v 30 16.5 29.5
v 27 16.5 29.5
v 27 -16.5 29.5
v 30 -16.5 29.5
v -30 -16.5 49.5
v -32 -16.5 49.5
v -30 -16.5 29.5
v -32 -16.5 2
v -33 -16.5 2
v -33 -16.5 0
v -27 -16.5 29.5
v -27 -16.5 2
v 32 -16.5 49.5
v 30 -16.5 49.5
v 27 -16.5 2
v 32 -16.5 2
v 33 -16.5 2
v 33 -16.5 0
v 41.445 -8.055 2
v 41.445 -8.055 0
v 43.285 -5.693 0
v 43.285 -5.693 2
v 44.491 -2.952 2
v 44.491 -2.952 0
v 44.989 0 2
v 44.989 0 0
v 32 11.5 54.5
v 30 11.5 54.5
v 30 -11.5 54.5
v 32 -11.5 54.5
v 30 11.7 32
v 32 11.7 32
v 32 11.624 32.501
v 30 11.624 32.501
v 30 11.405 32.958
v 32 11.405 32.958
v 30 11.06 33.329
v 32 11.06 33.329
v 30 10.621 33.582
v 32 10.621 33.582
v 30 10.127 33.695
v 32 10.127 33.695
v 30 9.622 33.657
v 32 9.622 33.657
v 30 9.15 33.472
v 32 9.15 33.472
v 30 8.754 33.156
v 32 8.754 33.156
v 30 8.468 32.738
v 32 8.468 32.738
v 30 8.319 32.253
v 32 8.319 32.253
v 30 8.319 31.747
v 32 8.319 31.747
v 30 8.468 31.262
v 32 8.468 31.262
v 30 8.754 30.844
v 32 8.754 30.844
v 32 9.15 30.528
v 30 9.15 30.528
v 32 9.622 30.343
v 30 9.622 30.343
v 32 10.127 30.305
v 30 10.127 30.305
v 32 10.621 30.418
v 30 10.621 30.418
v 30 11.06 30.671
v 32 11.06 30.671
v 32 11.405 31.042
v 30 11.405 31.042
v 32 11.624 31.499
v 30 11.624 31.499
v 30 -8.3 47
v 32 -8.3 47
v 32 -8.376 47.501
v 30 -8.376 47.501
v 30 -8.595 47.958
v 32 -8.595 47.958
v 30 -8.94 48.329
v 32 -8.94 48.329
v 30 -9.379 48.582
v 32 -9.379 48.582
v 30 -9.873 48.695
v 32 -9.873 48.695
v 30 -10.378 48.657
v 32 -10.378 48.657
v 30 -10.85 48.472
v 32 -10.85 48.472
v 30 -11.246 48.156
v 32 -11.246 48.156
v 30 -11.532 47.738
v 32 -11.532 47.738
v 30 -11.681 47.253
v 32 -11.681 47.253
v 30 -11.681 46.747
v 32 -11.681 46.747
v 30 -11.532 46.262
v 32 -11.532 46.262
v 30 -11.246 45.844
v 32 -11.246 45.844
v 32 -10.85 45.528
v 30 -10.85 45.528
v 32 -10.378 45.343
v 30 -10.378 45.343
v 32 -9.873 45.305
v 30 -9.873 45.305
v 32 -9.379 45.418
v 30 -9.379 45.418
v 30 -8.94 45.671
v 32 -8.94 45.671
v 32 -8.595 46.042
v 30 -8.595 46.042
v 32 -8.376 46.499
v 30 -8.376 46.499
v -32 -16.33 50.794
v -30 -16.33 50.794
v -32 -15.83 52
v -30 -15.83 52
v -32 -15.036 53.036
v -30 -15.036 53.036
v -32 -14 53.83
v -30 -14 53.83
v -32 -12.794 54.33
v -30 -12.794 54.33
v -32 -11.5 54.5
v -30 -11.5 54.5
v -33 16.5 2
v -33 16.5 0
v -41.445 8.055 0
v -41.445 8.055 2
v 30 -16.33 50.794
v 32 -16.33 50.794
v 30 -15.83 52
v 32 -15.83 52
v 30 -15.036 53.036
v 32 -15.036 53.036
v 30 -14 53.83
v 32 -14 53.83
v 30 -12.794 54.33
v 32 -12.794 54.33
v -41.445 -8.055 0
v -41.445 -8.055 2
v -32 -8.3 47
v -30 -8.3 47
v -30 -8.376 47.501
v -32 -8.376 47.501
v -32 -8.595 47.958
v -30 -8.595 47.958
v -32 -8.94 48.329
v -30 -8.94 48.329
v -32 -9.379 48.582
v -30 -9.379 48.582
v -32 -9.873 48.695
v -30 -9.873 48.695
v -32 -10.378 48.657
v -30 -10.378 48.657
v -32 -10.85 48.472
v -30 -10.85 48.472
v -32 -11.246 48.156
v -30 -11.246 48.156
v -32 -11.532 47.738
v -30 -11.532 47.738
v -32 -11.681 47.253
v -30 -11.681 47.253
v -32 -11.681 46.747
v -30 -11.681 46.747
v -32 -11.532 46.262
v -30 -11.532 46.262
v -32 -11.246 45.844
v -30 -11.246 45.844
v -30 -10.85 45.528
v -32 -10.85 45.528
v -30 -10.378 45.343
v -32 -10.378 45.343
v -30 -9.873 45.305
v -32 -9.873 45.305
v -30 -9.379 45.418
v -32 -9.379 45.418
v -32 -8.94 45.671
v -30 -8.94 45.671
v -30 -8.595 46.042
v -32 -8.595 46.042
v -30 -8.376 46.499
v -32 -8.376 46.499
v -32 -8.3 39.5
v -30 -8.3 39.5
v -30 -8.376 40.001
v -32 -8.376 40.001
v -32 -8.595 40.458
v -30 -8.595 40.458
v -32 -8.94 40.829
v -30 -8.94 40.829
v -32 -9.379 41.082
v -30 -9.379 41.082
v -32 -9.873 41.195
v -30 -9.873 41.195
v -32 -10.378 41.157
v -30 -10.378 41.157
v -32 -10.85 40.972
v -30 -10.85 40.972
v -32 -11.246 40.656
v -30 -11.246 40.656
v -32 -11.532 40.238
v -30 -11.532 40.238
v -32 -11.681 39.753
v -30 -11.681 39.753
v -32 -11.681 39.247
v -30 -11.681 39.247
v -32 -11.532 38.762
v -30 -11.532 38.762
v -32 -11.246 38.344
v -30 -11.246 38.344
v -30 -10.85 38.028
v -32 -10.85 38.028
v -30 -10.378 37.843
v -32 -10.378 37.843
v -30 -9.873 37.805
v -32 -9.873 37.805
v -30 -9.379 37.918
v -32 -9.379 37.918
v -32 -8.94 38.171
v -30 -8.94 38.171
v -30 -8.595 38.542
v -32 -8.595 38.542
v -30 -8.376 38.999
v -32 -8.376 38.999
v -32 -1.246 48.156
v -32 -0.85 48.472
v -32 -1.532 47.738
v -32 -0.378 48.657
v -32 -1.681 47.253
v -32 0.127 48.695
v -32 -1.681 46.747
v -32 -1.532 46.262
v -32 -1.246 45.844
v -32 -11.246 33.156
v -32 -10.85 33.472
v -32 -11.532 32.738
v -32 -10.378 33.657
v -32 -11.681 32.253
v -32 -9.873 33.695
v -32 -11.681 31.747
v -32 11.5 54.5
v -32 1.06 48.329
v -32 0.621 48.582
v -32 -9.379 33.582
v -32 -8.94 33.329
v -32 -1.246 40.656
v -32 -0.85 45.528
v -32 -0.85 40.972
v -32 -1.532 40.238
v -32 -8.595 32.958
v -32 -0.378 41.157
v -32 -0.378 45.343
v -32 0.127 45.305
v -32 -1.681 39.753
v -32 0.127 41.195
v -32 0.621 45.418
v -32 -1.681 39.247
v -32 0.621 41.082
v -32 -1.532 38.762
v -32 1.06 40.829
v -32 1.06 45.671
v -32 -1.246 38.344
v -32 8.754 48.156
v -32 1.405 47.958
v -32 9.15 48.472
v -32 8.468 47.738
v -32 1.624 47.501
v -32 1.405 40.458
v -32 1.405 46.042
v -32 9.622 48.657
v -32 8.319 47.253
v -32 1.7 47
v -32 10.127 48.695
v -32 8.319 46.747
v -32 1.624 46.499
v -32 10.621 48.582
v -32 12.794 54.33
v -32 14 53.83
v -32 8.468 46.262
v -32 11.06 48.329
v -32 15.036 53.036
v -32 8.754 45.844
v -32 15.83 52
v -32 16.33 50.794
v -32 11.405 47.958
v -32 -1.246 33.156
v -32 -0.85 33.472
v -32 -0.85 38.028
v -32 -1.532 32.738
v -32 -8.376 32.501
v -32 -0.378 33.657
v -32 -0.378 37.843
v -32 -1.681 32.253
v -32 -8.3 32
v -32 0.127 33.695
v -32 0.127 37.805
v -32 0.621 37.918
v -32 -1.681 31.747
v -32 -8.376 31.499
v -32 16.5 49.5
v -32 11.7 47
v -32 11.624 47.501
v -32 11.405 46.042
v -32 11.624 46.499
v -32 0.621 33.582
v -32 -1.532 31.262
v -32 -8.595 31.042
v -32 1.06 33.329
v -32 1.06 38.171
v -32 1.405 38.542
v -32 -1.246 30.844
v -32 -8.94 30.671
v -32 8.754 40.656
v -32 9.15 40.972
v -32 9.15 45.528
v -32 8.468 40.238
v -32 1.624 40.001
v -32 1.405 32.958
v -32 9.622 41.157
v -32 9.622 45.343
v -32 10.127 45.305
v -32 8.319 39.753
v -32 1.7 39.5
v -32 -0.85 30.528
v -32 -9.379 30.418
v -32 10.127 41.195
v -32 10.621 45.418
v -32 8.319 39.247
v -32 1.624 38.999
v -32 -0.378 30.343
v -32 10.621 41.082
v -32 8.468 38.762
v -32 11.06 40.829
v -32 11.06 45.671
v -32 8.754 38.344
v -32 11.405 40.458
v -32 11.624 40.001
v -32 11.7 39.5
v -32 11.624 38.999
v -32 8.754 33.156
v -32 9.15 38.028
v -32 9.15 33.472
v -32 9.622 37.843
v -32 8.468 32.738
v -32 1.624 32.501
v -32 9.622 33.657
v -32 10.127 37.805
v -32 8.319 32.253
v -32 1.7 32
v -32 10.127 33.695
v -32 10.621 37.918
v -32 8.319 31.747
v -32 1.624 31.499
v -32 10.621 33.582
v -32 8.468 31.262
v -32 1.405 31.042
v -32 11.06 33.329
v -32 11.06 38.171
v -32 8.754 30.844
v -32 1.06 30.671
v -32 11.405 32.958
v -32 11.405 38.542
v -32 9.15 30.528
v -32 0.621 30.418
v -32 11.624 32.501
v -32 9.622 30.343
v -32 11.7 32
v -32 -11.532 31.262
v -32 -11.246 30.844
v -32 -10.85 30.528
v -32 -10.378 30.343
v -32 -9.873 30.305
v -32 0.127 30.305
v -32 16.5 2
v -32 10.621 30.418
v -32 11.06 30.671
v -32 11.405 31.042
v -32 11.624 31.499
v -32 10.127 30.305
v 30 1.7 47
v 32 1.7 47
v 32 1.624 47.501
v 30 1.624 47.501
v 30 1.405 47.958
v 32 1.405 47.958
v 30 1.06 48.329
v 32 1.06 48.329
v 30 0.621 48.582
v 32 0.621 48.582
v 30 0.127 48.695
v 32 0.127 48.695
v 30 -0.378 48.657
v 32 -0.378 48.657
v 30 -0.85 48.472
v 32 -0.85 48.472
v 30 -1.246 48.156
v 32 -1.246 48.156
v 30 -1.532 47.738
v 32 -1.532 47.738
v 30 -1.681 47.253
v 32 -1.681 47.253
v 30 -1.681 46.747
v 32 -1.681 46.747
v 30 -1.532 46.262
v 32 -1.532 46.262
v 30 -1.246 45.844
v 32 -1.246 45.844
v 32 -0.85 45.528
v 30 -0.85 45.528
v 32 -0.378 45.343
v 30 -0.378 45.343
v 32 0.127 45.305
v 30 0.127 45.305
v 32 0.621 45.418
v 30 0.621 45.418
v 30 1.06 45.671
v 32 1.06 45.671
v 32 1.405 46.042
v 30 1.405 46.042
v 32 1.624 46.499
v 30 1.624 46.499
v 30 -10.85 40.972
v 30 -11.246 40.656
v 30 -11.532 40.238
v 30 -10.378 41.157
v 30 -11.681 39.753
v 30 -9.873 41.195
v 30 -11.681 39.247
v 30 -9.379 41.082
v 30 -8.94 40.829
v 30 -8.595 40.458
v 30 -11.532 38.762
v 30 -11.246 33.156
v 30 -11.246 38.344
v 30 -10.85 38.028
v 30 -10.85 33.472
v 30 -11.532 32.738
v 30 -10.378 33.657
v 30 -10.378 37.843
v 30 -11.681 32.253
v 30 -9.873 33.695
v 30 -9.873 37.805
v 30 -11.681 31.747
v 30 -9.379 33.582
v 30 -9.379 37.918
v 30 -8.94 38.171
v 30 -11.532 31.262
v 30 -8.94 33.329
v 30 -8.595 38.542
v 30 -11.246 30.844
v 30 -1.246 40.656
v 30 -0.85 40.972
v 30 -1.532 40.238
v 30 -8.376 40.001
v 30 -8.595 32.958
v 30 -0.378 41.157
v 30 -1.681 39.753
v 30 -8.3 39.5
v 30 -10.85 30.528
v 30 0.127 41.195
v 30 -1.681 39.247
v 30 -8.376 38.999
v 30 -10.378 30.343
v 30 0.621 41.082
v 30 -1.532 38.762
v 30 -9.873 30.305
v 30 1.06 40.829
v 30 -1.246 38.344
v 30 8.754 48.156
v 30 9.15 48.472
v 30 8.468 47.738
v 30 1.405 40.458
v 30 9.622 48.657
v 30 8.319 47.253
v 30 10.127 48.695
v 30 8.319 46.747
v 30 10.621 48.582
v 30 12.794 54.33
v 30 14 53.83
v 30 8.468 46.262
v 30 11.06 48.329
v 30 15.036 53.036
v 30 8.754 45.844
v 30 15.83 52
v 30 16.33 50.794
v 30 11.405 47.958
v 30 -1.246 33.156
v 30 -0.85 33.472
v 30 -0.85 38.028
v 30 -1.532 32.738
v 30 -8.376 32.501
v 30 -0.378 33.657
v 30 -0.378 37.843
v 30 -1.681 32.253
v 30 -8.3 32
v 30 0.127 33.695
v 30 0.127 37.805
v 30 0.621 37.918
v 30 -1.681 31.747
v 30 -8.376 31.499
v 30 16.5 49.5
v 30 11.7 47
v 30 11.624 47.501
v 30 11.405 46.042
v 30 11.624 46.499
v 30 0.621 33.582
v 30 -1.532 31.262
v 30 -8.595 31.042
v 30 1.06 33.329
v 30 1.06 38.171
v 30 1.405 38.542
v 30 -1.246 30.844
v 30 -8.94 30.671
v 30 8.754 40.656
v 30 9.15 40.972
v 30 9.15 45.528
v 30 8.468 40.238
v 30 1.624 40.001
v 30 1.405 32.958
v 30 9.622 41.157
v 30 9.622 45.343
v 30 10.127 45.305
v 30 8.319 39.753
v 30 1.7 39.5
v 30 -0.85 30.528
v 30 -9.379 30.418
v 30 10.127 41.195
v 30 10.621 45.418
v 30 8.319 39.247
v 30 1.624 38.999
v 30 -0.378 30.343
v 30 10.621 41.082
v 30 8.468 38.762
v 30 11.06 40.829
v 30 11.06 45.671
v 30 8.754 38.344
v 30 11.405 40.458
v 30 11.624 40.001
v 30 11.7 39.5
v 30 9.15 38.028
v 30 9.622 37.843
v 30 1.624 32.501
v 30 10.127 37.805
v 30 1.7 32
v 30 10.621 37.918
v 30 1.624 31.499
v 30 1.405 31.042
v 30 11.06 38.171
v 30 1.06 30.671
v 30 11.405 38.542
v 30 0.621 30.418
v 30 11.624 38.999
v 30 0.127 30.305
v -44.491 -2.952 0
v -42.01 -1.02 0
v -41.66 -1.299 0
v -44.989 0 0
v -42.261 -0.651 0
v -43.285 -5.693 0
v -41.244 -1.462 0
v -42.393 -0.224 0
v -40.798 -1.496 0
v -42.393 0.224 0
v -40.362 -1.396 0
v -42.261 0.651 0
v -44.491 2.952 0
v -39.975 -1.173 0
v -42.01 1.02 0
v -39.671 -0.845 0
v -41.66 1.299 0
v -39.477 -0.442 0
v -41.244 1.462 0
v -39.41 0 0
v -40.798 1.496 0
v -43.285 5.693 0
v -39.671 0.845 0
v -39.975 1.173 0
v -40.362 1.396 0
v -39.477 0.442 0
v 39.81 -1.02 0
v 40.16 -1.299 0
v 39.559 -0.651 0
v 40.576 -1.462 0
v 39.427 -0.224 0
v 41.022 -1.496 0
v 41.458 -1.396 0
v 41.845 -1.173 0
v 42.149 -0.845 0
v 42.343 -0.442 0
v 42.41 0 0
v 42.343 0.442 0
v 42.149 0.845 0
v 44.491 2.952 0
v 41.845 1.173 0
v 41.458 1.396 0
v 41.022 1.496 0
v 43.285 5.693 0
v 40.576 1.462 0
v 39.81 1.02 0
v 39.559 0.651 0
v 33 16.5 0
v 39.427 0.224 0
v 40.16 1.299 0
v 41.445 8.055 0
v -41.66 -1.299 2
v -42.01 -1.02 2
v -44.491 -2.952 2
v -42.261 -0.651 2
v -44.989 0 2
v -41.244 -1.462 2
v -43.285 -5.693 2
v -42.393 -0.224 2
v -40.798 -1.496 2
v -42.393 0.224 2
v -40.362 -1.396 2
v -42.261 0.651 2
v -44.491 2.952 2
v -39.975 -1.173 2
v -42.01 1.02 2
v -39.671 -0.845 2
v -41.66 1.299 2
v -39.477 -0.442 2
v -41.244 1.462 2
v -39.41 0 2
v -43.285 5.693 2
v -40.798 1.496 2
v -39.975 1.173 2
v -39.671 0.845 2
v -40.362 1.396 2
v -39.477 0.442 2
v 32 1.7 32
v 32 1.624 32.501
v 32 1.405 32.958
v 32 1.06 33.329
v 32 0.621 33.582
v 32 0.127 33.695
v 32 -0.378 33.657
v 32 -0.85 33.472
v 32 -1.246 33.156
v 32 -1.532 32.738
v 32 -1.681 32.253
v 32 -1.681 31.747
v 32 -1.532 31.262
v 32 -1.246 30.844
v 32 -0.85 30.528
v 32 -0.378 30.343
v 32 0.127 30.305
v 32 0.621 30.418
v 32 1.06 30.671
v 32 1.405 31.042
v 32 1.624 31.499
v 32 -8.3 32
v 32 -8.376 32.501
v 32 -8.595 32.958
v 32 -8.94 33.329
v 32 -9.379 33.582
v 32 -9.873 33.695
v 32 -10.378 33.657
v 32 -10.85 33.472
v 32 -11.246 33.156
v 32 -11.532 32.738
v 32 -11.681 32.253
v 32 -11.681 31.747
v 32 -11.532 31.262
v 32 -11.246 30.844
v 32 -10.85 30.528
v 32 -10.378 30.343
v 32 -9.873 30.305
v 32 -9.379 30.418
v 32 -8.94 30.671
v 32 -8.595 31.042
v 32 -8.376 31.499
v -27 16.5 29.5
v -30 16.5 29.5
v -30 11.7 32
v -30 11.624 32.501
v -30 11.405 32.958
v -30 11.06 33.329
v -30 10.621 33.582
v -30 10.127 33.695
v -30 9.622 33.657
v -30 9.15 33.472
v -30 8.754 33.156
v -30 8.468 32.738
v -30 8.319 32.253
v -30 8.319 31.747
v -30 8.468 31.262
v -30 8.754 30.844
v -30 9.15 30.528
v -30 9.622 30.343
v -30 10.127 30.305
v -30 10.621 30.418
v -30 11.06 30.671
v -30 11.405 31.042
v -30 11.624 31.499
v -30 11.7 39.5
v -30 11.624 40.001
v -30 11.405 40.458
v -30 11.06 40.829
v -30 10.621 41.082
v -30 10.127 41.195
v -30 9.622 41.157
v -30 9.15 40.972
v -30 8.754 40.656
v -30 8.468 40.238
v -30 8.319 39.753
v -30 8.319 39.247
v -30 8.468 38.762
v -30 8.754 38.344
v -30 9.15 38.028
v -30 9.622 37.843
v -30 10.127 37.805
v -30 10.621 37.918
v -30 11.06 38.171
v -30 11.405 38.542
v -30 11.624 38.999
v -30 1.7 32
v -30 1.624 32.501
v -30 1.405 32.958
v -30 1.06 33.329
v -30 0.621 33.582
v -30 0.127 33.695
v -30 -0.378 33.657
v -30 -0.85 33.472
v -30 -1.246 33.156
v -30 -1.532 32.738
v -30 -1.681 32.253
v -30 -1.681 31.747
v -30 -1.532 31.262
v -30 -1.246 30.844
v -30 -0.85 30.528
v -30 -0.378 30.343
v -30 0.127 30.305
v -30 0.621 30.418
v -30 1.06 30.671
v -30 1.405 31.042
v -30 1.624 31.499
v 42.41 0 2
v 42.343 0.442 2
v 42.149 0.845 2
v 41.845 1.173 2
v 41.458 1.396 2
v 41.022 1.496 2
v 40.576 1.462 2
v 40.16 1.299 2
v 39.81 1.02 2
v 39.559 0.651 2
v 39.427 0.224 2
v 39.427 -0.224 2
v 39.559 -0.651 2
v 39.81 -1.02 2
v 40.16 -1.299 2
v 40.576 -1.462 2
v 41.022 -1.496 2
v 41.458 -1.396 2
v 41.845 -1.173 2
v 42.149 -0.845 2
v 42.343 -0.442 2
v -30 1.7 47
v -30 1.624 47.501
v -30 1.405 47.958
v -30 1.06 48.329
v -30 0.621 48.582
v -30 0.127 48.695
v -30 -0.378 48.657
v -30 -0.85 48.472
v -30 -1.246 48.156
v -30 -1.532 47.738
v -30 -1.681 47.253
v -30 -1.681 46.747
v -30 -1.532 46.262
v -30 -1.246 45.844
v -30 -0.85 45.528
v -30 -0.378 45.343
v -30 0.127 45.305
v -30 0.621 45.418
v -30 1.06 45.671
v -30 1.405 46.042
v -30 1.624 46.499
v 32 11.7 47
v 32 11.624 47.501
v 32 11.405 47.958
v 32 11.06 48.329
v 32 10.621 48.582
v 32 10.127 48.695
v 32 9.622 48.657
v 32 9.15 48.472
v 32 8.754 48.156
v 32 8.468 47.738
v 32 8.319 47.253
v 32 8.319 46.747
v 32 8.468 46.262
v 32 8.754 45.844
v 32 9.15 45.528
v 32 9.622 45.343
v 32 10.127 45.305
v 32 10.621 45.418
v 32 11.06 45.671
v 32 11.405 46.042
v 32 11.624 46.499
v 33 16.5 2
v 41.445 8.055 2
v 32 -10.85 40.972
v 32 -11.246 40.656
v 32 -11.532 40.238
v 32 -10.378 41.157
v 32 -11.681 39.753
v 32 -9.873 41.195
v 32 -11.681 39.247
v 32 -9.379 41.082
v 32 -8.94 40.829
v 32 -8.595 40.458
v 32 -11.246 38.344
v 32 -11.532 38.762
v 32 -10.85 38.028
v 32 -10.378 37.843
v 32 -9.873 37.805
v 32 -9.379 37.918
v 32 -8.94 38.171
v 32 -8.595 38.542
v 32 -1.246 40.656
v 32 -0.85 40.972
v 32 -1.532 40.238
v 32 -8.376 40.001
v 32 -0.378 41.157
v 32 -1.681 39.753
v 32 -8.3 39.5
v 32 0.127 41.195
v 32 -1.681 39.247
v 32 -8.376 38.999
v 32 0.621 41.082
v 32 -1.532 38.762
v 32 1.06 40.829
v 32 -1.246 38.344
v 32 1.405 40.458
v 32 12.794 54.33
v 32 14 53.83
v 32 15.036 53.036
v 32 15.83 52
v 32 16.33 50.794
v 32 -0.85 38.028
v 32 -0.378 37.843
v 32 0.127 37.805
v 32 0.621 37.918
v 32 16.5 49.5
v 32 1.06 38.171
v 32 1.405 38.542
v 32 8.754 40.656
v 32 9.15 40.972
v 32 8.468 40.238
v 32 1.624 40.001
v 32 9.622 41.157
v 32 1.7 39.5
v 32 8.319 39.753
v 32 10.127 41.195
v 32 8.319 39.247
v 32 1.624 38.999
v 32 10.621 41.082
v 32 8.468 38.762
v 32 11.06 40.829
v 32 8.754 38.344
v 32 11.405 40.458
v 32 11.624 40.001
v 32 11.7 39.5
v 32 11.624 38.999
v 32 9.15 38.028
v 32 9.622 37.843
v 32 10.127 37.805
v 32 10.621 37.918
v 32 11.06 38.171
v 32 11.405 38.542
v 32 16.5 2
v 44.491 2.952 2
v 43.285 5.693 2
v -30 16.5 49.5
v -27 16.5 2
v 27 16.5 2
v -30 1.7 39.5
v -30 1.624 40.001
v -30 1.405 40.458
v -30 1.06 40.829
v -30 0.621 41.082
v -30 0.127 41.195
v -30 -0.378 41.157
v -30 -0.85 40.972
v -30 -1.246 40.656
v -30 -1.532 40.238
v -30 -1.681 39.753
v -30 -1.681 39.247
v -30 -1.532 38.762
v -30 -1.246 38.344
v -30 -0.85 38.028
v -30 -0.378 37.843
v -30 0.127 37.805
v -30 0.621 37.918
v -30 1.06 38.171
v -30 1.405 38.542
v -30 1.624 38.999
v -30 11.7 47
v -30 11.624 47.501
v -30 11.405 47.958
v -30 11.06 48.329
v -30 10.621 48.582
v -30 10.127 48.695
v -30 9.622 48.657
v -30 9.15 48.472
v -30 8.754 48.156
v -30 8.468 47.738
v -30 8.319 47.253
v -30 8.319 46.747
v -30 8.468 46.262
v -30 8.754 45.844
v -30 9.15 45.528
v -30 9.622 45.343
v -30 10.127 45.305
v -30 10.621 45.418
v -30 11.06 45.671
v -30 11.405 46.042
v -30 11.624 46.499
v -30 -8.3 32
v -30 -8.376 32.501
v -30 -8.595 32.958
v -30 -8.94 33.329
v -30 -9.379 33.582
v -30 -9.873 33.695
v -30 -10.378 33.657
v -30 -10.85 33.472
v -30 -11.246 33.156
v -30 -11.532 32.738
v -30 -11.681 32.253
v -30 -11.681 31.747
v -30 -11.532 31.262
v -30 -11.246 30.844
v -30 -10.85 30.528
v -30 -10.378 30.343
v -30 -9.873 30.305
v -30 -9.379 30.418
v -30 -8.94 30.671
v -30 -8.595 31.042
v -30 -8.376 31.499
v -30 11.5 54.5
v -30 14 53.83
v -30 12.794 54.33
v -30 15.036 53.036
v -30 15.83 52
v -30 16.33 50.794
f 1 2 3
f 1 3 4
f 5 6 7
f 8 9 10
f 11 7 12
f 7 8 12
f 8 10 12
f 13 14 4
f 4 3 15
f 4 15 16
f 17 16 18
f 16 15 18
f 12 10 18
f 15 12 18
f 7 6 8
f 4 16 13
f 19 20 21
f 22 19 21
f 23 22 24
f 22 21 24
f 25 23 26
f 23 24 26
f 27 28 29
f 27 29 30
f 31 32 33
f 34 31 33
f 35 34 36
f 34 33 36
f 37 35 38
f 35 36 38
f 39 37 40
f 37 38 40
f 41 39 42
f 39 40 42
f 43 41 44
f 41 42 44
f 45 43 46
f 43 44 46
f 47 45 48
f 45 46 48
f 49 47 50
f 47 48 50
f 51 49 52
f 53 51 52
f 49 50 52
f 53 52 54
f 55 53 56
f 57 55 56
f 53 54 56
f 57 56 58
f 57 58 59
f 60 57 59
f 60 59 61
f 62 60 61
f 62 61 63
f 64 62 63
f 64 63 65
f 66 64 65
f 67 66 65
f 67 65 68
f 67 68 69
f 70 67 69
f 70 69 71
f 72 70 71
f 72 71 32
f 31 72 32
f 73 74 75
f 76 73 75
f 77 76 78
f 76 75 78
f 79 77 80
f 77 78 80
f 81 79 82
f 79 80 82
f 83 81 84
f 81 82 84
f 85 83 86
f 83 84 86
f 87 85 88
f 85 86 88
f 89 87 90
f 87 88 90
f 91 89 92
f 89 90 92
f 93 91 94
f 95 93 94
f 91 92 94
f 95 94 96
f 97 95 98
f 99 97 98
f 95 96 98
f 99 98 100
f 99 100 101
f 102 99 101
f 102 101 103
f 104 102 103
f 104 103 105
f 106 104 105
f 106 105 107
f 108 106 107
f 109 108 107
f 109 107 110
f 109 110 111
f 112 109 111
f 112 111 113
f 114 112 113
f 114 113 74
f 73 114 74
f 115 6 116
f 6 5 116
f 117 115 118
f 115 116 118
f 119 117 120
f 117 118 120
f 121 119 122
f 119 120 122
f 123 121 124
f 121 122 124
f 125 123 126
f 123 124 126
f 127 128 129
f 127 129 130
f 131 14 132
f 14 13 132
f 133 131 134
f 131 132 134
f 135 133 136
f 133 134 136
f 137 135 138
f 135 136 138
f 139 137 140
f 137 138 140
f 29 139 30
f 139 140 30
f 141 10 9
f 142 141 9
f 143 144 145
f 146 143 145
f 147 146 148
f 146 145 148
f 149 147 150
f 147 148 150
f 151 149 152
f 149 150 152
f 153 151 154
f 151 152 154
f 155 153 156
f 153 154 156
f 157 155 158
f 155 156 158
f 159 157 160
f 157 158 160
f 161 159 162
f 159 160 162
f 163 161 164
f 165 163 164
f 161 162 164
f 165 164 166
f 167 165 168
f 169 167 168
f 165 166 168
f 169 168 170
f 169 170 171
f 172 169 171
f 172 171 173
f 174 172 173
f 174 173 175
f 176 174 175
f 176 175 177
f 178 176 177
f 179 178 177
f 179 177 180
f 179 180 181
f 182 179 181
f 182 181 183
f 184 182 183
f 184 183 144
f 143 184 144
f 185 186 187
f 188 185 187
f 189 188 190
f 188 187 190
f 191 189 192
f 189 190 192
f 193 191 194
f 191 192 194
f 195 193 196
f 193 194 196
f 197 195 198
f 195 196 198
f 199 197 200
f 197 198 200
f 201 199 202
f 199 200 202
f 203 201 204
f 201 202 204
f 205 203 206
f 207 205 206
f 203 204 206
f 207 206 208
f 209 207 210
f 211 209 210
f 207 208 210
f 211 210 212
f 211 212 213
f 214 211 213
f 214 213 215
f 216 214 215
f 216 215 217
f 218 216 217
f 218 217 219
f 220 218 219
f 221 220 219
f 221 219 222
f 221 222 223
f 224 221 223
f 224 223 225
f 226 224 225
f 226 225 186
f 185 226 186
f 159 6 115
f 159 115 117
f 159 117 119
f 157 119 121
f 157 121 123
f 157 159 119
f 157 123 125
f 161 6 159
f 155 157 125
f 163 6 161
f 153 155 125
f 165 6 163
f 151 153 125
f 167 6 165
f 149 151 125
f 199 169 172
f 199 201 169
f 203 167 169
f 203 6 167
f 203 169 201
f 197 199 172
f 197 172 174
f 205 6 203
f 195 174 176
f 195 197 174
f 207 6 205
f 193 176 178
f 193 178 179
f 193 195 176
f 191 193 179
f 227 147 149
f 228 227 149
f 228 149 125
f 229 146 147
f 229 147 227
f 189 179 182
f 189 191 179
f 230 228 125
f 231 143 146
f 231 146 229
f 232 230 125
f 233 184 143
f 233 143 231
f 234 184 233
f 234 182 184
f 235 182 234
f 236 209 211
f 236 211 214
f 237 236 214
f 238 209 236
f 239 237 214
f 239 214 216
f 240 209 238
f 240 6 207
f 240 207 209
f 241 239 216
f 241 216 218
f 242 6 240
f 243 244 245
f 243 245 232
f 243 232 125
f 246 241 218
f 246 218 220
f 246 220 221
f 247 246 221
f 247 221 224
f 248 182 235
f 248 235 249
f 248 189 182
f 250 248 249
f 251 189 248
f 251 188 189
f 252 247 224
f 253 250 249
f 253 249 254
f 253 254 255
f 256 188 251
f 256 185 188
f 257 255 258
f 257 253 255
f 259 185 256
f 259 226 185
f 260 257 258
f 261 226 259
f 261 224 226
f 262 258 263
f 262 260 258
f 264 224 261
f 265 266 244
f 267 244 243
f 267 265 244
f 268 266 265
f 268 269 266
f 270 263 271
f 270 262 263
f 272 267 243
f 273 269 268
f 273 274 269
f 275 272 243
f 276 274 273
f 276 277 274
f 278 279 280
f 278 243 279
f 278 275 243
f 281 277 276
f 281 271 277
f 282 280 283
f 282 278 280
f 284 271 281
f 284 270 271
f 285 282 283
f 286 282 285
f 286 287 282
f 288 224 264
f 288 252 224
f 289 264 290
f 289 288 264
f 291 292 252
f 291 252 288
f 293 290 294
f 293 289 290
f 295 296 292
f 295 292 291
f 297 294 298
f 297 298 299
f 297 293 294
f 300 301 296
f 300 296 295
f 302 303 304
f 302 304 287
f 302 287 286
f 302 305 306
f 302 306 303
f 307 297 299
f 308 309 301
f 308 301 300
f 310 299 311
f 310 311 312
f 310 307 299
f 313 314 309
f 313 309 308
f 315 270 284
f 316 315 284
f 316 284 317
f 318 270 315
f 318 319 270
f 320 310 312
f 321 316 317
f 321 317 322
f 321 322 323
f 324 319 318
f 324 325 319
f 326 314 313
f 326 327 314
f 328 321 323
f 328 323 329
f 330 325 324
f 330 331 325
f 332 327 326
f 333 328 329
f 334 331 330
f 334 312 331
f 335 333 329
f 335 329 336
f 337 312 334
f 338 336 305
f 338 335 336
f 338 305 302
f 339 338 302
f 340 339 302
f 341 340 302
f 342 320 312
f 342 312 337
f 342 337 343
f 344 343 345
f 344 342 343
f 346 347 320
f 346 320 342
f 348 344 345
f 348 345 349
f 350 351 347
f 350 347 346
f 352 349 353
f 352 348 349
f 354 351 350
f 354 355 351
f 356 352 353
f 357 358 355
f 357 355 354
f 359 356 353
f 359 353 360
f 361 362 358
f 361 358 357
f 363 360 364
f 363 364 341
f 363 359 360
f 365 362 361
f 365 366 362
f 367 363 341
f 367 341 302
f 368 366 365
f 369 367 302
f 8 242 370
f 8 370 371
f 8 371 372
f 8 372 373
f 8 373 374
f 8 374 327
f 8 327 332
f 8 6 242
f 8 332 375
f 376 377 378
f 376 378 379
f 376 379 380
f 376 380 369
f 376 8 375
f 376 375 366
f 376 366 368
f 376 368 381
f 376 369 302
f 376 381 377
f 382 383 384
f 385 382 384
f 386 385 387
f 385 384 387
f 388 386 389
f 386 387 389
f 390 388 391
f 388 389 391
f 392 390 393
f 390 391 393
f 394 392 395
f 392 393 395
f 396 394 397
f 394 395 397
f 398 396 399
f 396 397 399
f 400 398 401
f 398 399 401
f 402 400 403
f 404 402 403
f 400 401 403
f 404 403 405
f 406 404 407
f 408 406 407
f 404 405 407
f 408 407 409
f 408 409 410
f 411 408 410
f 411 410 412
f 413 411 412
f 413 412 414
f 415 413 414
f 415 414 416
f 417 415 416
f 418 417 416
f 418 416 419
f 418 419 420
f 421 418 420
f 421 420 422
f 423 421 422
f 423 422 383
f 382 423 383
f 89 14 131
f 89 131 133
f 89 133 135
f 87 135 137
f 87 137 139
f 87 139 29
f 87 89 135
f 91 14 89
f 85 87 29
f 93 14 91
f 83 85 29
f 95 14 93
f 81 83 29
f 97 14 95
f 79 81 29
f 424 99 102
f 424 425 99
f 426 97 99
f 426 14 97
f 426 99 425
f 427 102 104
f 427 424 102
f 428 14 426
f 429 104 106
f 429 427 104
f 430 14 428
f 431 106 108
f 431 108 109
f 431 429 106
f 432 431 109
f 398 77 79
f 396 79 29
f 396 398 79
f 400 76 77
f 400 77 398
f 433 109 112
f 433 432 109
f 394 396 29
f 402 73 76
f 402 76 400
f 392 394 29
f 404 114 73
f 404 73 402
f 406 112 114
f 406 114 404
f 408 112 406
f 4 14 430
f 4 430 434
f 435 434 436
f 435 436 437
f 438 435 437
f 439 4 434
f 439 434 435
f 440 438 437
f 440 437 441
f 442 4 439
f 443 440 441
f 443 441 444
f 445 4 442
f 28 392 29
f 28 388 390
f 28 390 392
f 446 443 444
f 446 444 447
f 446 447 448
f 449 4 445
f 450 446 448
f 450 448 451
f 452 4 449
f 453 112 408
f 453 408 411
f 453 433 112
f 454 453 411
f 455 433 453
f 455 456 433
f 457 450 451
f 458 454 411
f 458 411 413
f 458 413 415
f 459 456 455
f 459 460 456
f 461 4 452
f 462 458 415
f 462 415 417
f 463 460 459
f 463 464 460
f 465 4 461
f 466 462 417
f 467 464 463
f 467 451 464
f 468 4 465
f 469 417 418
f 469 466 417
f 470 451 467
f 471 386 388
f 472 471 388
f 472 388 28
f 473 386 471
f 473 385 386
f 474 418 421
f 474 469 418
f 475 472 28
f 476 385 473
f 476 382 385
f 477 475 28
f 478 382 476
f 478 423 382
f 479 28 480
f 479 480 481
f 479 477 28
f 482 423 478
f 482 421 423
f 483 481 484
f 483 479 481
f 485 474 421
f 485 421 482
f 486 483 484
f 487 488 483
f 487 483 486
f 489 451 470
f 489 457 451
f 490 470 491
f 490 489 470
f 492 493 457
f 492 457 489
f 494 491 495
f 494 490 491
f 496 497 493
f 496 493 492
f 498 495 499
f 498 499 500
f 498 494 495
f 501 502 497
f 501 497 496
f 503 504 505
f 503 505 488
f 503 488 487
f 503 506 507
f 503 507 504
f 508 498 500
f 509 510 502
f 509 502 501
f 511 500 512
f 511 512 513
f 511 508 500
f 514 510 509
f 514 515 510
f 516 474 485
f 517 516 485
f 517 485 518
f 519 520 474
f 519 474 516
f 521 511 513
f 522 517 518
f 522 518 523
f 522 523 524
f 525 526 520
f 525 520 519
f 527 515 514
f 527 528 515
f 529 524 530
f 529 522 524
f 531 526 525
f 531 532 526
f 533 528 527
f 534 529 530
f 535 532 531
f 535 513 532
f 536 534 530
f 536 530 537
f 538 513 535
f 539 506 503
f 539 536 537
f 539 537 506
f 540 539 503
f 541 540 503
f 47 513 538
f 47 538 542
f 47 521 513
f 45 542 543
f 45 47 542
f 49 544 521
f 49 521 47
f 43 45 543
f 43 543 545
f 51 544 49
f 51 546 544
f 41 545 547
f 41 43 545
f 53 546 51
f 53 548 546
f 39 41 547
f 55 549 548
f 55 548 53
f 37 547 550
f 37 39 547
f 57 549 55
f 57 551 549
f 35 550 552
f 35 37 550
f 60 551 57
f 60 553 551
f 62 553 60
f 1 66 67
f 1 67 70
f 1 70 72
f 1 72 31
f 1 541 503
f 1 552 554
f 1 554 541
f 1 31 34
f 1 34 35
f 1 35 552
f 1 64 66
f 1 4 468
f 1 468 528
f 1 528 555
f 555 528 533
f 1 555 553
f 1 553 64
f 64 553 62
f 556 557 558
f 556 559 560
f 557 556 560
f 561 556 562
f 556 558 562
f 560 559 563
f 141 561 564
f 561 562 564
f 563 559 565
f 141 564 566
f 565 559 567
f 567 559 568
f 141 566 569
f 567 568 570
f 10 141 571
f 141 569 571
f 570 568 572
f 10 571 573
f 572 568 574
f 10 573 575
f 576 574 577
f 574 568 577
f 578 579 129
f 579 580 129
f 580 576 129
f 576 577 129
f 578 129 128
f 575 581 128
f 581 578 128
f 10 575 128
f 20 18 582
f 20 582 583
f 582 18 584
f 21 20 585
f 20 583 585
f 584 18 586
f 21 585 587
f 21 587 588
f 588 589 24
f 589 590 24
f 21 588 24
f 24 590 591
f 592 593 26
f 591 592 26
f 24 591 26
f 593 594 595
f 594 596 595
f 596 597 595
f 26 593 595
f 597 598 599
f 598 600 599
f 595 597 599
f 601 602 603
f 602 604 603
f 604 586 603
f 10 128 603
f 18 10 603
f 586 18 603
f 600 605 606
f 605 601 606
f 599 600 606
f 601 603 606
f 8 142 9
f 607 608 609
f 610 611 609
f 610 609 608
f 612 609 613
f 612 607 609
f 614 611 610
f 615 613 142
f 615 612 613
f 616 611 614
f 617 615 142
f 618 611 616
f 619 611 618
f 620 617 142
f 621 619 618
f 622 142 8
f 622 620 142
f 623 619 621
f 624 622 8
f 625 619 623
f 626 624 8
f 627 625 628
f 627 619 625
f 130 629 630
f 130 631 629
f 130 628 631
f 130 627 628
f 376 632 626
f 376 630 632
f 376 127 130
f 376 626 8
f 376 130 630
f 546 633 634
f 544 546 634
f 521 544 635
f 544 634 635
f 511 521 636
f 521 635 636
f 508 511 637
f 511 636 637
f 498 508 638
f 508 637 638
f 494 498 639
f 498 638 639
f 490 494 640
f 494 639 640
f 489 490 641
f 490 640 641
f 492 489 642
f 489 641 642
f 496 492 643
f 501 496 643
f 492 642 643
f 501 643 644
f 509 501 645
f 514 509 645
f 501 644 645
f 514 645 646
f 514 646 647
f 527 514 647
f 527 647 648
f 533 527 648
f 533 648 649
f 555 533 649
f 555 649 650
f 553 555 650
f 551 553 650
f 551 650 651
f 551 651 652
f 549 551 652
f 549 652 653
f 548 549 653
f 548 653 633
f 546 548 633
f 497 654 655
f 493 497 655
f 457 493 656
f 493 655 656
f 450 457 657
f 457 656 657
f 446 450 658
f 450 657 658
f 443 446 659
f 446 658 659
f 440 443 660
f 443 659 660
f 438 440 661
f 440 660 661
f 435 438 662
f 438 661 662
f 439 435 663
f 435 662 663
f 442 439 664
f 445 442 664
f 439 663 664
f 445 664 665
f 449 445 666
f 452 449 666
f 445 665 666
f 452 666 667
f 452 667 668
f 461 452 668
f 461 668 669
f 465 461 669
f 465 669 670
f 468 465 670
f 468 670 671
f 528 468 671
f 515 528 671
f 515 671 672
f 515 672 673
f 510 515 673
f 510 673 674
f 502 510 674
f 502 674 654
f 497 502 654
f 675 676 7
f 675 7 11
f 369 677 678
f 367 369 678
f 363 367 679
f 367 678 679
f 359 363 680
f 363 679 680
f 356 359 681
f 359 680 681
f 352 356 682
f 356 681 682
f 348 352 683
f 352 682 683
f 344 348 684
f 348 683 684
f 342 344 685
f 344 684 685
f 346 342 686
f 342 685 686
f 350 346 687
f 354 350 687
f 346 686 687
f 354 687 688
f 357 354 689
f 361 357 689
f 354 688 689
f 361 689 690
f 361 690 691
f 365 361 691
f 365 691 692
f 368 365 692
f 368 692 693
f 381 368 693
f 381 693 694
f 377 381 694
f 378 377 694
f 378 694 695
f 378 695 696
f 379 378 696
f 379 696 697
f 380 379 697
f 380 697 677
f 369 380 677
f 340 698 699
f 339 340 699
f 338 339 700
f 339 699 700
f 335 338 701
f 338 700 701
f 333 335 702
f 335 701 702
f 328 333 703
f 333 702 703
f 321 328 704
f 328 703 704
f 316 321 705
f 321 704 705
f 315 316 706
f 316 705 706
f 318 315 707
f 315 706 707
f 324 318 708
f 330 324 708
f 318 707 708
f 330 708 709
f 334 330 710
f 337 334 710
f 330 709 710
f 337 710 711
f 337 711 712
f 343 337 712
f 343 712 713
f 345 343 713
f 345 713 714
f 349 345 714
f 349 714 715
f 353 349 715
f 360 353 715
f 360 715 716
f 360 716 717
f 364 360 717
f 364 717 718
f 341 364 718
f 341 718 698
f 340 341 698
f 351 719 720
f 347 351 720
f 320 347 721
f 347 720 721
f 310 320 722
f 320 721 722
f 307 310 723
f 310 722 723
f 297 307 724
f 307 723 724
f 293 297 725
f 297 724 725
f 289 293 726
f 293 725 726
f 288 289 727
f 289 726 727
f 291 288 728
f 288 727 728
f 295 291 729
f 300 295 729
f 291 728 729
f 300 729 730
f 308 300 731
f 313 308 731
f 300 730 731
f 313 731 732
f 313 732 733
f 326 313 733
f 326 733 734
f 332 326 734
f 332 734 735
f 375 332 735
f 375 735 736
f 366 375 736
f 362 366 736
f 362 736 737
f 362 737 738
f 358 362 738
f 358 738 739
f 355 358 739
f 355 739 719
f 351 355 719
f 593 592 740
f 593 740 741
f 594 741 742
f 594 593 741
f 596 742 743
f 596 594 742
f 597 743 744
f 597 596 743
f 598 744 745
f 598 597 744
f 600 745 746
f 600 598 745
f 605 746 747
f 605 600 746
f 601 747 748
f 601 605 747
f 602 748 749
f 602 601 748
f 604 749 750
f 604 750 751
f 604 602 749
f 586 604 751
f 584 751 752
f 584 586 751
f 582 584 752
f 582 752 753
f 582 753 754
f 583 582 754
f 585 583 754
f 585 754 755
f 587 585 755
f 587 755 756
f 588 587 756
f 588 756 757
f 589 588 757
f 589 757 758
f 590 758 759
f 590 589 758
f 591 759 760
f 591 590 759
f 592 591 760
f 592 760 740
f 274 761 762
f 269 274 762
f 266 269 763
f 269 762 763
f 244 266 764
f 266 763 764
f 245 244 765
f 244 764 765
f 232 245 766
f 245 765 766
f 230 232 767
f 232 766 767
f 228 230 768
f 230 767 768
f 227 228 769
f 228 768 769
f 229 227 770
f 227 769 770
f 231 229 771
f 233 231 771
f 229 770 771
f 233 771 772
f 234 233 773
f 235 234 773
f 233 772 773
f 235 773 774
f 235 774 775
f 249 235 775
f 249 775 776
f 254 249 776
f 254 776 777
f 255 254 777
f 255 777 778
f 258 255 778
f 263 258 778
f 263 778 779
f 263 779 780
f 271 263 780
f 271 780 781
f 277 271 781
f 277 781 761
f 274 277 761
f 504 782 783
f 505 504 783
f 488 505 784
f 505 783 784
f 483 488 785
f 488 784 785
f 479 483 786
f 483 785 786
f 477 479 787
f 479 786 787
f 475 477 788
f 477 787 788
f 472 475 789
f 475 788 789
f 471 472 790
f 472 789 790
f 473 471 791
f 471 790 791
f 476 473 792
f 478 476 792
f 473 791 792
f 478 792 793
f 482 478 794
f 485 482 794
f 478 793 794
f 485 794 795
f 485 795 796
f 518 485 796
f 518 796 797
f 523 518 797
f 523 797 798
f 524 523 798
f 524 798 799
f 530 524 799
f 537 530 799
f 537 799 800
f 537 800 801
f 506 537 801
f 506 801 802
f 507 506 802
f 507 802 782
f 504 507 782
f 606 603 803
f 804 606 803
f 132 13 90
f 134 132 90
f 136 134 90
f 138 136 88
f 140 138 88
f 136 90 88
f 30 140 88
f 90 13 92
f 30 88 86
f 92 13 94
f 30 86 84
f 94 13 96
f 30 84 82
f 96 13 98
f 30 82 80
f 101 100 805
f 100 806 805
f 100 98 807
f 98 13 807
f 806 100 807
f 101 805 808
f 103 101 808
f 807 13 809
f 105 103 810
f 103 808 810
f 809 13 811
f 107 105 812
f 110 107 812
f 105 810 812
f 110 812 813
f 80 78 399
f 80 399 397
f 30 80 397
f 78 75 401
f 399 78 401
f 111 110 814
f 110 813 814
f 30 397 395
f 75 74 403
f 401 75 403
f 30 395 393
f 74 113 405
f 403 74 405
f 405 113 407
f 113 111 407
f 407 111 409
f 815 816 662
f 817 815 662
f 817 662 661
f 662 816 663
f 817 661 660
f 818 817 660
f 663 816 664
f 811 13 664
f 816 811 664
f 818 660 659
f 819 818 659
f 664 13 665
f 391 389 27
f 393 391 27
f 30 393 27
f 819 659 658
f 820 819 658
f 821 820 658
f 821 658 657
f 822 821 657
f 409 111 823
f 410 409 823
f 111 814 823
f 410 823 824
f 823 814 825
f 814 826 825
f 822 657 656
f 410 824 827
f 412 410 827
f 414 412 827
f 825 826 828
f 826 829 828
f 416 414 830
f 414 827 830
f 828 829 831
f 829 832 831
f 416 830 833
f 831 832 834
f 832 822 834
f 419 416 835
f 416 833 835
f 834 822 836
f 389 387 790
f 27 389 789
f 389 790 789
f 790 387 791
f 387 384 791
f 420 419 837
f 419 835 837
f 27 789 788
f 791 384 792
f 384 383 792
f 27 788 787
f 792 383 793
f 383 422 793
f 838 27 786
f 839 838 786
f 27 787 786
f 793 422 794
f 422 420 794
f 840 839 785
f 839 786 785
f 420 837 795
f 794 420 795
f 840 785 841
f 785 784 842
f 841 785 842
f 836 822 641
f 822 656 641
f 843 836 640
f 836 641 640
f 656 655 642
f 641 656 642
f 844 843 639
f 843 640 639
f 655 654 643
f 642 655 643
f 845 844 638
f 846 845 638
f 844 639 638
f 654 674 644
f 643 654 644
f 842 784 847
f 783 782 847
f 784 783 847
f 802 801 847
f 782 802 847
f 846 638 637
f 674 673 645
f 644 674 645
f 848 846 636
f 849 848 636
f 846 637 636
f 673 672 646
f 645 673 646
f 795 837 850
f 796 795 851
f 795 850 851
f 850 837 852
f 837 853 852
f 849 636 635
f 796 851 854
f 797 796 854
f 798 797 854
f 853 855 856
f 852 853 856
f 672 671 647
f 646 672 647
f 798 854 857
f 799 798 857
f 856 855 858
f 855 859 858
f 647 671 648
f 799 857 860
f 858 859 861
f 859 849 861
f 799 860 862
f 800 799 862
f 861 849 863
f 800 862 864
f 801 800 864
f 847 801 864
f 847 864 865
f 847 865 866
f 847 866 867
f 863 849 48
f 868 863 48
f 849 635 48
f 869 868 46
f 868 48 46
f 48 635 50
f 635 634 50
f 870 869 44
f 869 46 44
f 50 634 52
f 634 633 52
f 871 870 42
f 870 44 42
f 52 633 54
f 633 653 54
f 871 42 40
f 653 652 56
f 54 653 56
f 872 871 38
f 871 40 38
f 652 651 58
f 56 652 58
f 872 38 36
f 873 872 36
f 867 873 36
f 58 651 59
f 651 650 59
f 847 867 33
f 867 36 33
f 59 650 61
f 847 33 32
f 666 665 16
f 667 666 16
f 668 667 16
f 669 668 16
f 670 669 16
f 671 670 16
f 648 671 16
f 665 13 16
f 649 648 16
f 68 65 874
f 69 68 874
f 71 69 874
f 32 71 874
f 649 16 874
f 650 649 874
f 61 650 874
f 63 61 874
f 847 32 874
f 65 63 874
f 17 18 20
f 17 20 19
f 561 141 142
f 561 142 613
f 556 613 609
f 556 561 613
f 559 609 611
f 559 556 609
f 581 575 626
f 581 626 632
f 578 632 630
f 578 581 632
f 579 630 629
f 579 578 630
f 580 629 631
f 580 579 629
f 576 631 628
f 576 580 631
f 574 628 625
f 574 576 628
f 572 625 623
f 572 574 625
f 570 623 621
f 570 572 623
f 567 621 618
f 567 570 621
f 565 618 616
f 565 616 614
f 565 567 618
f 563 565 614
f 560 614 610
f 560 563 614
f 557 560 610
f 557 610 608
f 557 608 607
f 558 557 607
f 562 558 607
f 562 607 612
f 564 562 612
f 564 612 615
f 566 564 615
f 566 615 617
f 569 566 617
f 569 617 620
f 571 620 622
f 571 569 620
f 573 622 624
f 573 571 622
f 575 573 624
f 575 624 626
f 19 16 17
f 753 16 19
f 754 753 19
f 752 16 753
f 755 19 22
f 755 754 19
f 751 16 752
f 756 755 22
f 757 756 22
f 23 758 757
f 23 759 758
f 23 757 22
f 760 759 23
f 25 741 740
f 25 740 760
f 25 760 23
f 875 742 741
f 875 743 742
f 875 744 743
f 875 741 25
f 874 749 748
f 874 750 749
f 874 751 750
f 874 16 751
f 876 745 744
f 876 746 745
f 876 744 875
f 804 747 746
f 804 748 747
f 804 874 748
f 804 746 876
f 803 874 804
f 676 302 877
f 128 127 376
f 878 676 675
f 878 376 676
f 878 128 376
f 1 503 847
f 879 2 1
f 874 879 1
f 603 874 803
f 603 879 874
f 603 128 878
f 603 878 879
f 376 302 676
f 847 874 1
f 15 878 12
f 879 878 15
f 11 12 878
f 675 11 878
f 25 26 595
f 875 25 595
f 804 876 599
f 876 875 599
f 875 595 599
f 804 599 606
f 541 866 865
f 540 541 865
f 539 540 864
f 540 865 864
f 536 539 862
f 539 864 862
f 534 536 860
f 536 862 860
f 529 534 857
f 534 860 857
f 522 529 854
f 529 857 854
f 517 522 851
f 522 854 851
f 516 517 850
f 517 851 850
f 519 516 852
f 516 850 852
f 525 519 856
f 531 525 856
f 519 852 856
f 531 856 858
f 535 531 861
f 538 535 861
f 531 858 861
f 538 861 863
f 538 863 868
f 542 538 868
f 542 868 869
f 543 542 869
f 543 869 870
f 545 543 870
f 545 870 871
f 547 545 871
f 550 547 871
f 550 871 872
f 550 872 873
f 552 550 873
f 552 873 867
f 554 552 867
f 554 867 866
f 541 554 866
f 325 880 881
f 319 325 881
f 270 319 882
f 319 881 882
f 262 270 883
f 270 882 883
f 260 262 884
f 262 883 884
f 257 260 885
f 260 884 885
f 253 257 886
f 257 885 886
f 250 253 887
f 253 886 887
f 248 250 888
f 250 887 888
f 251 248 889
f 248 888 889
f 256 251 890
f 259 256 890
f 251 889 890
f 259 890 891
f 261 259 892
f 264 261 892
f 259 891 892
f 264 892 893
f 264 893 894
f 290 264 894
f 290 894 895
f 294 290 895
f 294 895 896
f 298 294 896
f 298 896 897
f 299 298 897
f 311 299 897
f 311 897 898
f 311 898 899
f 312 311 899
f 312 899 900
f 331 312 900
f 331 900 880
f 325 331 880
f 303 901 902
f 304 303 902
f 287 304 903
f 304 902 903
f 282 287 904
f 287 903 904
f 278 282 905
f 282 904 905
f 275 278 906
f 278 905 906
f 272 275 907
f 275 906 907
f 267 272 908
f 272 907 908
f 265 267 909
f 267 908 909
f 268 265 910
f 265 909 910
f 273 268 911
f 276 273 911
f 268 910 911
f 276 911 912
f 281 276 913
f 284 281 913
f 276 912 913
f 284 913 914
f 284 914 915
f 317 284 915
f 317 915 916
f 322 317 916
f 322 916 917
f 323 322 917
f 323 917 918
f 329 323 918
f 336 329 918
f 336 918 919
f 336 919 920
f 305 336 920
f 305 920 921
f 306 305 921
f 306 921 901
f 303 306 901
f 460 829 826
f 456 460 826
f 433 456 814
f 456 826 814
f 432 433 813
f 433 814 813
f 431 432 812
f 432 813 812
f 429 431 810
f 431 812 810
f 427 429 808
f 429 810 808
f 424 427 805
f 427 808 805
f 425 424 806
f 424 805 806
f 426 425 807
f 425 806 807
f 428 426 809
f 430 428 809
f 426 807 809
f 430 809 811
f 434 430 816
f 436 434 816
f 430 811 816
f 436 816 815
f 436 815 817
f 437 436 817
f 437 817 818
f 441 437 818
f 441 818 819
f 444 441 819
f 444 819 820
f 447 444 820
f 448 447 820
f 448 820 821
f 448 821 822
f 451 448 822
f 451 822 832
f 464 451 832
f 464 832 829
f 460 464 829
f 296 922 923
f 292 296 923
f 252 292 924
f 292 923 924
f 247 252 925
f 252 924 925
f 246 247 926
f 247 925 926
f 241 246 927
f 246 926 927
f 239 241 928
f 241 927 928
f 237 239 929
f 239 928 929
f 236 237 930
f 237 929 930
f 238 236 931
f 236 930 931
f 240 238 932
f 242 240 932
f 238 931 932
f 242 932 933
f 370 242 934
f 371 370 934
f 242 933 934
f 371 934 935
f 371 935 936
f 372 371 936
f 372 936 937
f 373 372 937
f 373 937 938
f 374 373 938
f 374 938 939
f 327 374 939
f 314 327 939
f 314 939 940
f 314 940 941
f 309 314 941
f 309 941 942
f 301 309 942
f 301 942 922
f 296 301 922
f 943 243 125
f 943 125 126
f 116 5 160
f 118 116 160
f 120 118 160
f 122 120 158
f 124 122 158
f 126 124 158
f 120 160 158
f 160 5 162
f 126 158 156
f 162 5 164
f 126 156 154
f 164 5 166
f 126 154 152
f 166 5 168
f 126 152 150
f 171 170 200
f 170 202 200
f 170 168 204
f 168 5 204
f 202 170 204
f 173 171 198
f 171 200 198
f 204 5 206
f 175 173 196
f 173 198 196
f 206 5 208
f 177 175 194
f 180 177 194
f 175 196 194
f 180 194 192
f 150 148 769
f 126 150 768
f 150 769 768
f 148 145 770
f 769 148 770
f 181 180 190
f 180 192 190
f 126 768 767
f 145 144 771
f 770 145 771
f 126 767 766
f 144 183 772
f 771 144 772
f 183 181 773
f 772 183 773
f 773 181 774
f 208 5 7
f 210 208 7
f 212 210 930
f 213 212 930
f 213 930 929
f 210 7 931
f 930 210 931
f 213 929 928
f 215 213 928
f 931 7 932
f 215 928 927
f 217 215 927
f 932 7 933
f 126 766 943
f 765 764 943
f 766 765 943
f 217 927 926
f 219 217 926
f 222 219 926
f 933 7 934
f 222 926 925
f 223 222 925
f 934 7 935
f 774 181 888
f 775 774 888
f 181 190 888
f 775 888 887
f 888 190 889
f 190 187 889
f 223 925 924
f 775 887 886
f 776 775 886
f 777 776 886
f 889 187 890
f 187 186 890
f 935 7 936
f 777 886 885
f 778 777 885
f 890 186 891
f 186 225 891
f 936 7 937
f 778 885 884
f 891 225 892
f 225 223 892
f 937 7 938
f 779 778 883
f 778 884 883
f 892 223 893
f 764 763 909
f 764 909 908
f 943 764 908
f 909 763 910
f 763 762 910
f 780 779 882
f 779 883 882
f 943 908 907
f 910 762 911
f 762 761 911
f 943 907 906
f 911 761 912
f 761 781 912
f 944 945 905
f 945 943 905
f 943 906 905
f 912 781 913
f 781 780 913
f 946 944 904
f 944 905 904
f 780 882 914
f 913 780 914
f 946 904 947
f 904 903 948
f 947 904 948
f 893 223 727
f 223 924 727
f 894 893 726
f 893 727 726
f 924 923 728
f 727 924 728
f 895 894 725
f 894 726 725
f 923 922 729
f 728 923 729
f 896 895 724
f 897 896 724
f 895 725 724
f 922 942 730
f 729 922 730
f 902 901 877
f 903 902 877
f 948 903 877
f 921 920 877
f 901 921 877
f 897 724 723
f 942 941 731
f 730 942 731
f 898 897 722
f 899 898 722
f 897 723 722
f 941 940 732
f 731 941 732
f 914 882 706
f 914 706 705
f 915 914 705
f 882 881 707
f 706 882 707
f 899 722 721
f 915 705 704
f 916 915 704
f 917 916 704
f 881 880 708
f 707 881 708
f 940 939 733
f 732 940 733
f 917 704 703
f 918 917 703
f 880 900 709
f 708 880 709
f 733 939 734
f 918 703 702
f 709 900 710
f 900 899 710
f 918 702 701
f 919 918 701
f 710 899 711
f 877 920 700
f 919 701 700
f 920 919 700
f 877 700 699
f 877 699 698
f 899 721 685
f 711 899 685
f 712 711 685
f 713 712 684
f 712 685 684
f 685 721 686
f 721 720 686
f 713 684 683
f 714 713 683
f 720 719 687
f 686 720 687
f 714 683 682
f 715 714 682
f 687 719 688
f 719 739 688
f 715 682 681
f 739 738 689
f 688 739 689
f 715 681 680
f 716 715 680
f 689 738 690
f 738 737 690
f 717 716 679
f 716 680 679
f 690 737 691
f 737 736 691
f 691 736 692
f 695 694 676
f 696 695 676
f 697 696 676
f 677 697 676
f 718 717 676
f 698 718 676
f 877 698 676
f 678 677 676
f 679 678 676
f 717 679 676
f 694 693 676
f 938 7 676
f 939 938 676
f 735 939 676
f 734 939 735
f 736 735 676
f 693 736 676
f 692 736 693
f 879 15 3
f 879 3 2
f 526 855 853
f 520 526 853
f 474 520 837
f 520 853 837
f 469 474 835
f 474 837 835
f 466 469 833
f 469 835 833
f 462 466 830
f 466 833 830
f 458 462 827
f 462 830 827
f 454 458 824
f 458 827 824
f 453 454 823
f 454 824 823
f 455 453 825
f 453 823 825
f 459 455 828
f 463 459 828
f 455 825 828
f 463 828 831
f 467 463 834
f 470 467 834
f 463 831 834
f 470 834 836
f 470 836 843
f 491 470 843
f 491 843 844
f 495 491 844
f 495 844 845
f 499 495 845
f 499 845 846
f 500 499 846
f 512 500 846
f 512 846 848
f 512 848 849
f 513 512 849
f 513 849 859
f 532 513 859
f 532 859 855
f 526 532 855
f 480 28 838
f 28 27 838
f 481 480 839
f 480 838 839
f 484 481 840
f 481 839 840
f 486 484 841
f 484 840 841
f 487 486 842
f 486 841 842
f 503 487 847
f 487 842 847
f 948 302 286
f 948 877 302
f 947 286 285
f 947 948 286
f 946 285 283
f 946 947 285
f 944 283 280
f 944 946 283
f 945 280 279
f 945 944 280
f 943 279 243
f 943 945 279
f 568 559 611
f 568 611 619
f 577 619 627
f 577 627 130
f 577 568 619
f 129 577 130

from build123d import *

# Parameters (mm, degrees)
F0_W         = 90
F0_H         = 33
F0_R         = 1.5
F1_DEPTH     = 2
F2_W         = 5
F2_H         = 33
F3_DEPTH     = 27.5
F4_W         = 2
F4_H         = 33
F5_DEPTH     = 25
F6_W         = 2
F6_H         = 33
F7_DEPTH     = 25
F9_D         = 3.4
F10_R        = 5
F11_SIZE     = 12
F12_T1_DEPTH = 27.1366974606


# Not quite as in the source:
# - a fillet or chamfer that OpenCascade refuses, or shapes differently, is made with other operations: its cross-section is extruded or revolved along the edge and cut away or added


with BuildPart() as f1:
    # F0 (on Top) → F1 (new body)
    with BuildSketch(Plane.XY):
        Rectangle(F0_W, F0_H)
        with Locations((-40.91, 0)):
            Circle(F0_R, mode=Mode.SUBTRACT)
        with Locations((40.91, 0)):
            Circle(F0_R, mode=Mode.SUBTRACT)
    extrude(amount=F1_DEPTH)

    # F2 (on face) → F3 (join)
    with BuildSketch(Plane.XY.offset(2)):
        with Locations((-29.5, 0)):
            Rectangle(F2_W, F2_H)
        with Locations((29.5, 0)):
            Rectangle(F2_W, F2_H)
    extrude(amount=F3_DEPTH)

    # F4 (on face) → F5 (join)
    with BuildSketch(Plane.XY.offset(29.5)):
        with Locations((-31, 0)):
            Rectangle(F4_W, F4_H)
    extrude(amount=F5_DEPTH)

    # F6 (on face) → F7 (join)
    with BuildSketch(Plane.XY.offset(29.5)):
        with Locations((31, 0)):
            Rectangle(F6_W, F6_H)
    extrude(amount=F7_DEPTH)

    # F9 (through all)
    with Locations(Plane(origin=(-32, 0, 0), x_dir=(0, -1, 0), z_dir=(-1, 0, 0))):
        with Locations((-10, 47), (-10, 39.5), (0, 39.5), (0, 47), (10, 47), (10, 39.5), (-10, 32), (0, 32), (10, 32)):
            Hole(F9_D / 2)

    # F10
    f10_edges = [f1.edges().sort_by_distance(p)[0] for p in [
        (-31, 16.5, 54.5),
        (31, 16.5, 54.5),
        (-31, -16.5, 54.5),
        (31, -16.5, 54.5),
    ]]
    fillet(f10_edges, radius=F10_R)

    # F11
    f11_edges = [f1.edges().sort_by_distance(p)[0] for p in [
        (45, 16.5, 1),
        (45, -16.5, 1),
        (-45, -16.5, 1),
        (-45, 16.5, 1),
    ]]
    chamfer(f11_edges, length=F11_SIZE)

    # F12: fillet of radius 12.1370711845 on 4 edges, made by hand

    # F12_s2 → F12_t1 (cut)
    with BuildSketch(Plane.XY.offset(-12.5683487303)):
        with BuildLine():
            ThreePointArc((41.4451341538, -8.0548658462), (44.0761204675, -4.1173165676), (45, 0.5273394921))
            Line((45, 0.5273394921), (45, -4.5))
            Line((45, -4.5), (41.4451341538, -8.0548658462))
        make_face()
        with BuildLine():
            ThreePointArc((45, -0.5273394921), (44.0761204675, 4.1173165676), (41.4451341538, 8.0548658462))
            Line((41.4451341538, 8.0548658462), (45, 4.5))
            Line((45, 4.5), (45, -0.5273394921))
        make_face()
        with BuildLine():
            ThreePointArc((-41.4451341538, -8.0548658462), (-44.0761204675, -4.1173165676), (-45, 0.5273394921))
            Line((-45, 0.5273394921), (-45, -4.5))
            Line((-45, -4.5), (-41.4451341538, -8.0548658462))
        make_face()
        with BuildLine():
            ThreePointArc((-45, -0.5273394921), (-44.0761204675, 4.1173165676), (-41.4451341538, 8.0548658462))
            Line((-41.4451341538, 8.0548658462), (-45, 4.5))
            Line((-45, 4.5), (-45, -0.5273394921))
        make_face()
    extrude(amount=F12_T1_DEPTH, mode=Mode.SUBTRACT)


solid = f1.part
